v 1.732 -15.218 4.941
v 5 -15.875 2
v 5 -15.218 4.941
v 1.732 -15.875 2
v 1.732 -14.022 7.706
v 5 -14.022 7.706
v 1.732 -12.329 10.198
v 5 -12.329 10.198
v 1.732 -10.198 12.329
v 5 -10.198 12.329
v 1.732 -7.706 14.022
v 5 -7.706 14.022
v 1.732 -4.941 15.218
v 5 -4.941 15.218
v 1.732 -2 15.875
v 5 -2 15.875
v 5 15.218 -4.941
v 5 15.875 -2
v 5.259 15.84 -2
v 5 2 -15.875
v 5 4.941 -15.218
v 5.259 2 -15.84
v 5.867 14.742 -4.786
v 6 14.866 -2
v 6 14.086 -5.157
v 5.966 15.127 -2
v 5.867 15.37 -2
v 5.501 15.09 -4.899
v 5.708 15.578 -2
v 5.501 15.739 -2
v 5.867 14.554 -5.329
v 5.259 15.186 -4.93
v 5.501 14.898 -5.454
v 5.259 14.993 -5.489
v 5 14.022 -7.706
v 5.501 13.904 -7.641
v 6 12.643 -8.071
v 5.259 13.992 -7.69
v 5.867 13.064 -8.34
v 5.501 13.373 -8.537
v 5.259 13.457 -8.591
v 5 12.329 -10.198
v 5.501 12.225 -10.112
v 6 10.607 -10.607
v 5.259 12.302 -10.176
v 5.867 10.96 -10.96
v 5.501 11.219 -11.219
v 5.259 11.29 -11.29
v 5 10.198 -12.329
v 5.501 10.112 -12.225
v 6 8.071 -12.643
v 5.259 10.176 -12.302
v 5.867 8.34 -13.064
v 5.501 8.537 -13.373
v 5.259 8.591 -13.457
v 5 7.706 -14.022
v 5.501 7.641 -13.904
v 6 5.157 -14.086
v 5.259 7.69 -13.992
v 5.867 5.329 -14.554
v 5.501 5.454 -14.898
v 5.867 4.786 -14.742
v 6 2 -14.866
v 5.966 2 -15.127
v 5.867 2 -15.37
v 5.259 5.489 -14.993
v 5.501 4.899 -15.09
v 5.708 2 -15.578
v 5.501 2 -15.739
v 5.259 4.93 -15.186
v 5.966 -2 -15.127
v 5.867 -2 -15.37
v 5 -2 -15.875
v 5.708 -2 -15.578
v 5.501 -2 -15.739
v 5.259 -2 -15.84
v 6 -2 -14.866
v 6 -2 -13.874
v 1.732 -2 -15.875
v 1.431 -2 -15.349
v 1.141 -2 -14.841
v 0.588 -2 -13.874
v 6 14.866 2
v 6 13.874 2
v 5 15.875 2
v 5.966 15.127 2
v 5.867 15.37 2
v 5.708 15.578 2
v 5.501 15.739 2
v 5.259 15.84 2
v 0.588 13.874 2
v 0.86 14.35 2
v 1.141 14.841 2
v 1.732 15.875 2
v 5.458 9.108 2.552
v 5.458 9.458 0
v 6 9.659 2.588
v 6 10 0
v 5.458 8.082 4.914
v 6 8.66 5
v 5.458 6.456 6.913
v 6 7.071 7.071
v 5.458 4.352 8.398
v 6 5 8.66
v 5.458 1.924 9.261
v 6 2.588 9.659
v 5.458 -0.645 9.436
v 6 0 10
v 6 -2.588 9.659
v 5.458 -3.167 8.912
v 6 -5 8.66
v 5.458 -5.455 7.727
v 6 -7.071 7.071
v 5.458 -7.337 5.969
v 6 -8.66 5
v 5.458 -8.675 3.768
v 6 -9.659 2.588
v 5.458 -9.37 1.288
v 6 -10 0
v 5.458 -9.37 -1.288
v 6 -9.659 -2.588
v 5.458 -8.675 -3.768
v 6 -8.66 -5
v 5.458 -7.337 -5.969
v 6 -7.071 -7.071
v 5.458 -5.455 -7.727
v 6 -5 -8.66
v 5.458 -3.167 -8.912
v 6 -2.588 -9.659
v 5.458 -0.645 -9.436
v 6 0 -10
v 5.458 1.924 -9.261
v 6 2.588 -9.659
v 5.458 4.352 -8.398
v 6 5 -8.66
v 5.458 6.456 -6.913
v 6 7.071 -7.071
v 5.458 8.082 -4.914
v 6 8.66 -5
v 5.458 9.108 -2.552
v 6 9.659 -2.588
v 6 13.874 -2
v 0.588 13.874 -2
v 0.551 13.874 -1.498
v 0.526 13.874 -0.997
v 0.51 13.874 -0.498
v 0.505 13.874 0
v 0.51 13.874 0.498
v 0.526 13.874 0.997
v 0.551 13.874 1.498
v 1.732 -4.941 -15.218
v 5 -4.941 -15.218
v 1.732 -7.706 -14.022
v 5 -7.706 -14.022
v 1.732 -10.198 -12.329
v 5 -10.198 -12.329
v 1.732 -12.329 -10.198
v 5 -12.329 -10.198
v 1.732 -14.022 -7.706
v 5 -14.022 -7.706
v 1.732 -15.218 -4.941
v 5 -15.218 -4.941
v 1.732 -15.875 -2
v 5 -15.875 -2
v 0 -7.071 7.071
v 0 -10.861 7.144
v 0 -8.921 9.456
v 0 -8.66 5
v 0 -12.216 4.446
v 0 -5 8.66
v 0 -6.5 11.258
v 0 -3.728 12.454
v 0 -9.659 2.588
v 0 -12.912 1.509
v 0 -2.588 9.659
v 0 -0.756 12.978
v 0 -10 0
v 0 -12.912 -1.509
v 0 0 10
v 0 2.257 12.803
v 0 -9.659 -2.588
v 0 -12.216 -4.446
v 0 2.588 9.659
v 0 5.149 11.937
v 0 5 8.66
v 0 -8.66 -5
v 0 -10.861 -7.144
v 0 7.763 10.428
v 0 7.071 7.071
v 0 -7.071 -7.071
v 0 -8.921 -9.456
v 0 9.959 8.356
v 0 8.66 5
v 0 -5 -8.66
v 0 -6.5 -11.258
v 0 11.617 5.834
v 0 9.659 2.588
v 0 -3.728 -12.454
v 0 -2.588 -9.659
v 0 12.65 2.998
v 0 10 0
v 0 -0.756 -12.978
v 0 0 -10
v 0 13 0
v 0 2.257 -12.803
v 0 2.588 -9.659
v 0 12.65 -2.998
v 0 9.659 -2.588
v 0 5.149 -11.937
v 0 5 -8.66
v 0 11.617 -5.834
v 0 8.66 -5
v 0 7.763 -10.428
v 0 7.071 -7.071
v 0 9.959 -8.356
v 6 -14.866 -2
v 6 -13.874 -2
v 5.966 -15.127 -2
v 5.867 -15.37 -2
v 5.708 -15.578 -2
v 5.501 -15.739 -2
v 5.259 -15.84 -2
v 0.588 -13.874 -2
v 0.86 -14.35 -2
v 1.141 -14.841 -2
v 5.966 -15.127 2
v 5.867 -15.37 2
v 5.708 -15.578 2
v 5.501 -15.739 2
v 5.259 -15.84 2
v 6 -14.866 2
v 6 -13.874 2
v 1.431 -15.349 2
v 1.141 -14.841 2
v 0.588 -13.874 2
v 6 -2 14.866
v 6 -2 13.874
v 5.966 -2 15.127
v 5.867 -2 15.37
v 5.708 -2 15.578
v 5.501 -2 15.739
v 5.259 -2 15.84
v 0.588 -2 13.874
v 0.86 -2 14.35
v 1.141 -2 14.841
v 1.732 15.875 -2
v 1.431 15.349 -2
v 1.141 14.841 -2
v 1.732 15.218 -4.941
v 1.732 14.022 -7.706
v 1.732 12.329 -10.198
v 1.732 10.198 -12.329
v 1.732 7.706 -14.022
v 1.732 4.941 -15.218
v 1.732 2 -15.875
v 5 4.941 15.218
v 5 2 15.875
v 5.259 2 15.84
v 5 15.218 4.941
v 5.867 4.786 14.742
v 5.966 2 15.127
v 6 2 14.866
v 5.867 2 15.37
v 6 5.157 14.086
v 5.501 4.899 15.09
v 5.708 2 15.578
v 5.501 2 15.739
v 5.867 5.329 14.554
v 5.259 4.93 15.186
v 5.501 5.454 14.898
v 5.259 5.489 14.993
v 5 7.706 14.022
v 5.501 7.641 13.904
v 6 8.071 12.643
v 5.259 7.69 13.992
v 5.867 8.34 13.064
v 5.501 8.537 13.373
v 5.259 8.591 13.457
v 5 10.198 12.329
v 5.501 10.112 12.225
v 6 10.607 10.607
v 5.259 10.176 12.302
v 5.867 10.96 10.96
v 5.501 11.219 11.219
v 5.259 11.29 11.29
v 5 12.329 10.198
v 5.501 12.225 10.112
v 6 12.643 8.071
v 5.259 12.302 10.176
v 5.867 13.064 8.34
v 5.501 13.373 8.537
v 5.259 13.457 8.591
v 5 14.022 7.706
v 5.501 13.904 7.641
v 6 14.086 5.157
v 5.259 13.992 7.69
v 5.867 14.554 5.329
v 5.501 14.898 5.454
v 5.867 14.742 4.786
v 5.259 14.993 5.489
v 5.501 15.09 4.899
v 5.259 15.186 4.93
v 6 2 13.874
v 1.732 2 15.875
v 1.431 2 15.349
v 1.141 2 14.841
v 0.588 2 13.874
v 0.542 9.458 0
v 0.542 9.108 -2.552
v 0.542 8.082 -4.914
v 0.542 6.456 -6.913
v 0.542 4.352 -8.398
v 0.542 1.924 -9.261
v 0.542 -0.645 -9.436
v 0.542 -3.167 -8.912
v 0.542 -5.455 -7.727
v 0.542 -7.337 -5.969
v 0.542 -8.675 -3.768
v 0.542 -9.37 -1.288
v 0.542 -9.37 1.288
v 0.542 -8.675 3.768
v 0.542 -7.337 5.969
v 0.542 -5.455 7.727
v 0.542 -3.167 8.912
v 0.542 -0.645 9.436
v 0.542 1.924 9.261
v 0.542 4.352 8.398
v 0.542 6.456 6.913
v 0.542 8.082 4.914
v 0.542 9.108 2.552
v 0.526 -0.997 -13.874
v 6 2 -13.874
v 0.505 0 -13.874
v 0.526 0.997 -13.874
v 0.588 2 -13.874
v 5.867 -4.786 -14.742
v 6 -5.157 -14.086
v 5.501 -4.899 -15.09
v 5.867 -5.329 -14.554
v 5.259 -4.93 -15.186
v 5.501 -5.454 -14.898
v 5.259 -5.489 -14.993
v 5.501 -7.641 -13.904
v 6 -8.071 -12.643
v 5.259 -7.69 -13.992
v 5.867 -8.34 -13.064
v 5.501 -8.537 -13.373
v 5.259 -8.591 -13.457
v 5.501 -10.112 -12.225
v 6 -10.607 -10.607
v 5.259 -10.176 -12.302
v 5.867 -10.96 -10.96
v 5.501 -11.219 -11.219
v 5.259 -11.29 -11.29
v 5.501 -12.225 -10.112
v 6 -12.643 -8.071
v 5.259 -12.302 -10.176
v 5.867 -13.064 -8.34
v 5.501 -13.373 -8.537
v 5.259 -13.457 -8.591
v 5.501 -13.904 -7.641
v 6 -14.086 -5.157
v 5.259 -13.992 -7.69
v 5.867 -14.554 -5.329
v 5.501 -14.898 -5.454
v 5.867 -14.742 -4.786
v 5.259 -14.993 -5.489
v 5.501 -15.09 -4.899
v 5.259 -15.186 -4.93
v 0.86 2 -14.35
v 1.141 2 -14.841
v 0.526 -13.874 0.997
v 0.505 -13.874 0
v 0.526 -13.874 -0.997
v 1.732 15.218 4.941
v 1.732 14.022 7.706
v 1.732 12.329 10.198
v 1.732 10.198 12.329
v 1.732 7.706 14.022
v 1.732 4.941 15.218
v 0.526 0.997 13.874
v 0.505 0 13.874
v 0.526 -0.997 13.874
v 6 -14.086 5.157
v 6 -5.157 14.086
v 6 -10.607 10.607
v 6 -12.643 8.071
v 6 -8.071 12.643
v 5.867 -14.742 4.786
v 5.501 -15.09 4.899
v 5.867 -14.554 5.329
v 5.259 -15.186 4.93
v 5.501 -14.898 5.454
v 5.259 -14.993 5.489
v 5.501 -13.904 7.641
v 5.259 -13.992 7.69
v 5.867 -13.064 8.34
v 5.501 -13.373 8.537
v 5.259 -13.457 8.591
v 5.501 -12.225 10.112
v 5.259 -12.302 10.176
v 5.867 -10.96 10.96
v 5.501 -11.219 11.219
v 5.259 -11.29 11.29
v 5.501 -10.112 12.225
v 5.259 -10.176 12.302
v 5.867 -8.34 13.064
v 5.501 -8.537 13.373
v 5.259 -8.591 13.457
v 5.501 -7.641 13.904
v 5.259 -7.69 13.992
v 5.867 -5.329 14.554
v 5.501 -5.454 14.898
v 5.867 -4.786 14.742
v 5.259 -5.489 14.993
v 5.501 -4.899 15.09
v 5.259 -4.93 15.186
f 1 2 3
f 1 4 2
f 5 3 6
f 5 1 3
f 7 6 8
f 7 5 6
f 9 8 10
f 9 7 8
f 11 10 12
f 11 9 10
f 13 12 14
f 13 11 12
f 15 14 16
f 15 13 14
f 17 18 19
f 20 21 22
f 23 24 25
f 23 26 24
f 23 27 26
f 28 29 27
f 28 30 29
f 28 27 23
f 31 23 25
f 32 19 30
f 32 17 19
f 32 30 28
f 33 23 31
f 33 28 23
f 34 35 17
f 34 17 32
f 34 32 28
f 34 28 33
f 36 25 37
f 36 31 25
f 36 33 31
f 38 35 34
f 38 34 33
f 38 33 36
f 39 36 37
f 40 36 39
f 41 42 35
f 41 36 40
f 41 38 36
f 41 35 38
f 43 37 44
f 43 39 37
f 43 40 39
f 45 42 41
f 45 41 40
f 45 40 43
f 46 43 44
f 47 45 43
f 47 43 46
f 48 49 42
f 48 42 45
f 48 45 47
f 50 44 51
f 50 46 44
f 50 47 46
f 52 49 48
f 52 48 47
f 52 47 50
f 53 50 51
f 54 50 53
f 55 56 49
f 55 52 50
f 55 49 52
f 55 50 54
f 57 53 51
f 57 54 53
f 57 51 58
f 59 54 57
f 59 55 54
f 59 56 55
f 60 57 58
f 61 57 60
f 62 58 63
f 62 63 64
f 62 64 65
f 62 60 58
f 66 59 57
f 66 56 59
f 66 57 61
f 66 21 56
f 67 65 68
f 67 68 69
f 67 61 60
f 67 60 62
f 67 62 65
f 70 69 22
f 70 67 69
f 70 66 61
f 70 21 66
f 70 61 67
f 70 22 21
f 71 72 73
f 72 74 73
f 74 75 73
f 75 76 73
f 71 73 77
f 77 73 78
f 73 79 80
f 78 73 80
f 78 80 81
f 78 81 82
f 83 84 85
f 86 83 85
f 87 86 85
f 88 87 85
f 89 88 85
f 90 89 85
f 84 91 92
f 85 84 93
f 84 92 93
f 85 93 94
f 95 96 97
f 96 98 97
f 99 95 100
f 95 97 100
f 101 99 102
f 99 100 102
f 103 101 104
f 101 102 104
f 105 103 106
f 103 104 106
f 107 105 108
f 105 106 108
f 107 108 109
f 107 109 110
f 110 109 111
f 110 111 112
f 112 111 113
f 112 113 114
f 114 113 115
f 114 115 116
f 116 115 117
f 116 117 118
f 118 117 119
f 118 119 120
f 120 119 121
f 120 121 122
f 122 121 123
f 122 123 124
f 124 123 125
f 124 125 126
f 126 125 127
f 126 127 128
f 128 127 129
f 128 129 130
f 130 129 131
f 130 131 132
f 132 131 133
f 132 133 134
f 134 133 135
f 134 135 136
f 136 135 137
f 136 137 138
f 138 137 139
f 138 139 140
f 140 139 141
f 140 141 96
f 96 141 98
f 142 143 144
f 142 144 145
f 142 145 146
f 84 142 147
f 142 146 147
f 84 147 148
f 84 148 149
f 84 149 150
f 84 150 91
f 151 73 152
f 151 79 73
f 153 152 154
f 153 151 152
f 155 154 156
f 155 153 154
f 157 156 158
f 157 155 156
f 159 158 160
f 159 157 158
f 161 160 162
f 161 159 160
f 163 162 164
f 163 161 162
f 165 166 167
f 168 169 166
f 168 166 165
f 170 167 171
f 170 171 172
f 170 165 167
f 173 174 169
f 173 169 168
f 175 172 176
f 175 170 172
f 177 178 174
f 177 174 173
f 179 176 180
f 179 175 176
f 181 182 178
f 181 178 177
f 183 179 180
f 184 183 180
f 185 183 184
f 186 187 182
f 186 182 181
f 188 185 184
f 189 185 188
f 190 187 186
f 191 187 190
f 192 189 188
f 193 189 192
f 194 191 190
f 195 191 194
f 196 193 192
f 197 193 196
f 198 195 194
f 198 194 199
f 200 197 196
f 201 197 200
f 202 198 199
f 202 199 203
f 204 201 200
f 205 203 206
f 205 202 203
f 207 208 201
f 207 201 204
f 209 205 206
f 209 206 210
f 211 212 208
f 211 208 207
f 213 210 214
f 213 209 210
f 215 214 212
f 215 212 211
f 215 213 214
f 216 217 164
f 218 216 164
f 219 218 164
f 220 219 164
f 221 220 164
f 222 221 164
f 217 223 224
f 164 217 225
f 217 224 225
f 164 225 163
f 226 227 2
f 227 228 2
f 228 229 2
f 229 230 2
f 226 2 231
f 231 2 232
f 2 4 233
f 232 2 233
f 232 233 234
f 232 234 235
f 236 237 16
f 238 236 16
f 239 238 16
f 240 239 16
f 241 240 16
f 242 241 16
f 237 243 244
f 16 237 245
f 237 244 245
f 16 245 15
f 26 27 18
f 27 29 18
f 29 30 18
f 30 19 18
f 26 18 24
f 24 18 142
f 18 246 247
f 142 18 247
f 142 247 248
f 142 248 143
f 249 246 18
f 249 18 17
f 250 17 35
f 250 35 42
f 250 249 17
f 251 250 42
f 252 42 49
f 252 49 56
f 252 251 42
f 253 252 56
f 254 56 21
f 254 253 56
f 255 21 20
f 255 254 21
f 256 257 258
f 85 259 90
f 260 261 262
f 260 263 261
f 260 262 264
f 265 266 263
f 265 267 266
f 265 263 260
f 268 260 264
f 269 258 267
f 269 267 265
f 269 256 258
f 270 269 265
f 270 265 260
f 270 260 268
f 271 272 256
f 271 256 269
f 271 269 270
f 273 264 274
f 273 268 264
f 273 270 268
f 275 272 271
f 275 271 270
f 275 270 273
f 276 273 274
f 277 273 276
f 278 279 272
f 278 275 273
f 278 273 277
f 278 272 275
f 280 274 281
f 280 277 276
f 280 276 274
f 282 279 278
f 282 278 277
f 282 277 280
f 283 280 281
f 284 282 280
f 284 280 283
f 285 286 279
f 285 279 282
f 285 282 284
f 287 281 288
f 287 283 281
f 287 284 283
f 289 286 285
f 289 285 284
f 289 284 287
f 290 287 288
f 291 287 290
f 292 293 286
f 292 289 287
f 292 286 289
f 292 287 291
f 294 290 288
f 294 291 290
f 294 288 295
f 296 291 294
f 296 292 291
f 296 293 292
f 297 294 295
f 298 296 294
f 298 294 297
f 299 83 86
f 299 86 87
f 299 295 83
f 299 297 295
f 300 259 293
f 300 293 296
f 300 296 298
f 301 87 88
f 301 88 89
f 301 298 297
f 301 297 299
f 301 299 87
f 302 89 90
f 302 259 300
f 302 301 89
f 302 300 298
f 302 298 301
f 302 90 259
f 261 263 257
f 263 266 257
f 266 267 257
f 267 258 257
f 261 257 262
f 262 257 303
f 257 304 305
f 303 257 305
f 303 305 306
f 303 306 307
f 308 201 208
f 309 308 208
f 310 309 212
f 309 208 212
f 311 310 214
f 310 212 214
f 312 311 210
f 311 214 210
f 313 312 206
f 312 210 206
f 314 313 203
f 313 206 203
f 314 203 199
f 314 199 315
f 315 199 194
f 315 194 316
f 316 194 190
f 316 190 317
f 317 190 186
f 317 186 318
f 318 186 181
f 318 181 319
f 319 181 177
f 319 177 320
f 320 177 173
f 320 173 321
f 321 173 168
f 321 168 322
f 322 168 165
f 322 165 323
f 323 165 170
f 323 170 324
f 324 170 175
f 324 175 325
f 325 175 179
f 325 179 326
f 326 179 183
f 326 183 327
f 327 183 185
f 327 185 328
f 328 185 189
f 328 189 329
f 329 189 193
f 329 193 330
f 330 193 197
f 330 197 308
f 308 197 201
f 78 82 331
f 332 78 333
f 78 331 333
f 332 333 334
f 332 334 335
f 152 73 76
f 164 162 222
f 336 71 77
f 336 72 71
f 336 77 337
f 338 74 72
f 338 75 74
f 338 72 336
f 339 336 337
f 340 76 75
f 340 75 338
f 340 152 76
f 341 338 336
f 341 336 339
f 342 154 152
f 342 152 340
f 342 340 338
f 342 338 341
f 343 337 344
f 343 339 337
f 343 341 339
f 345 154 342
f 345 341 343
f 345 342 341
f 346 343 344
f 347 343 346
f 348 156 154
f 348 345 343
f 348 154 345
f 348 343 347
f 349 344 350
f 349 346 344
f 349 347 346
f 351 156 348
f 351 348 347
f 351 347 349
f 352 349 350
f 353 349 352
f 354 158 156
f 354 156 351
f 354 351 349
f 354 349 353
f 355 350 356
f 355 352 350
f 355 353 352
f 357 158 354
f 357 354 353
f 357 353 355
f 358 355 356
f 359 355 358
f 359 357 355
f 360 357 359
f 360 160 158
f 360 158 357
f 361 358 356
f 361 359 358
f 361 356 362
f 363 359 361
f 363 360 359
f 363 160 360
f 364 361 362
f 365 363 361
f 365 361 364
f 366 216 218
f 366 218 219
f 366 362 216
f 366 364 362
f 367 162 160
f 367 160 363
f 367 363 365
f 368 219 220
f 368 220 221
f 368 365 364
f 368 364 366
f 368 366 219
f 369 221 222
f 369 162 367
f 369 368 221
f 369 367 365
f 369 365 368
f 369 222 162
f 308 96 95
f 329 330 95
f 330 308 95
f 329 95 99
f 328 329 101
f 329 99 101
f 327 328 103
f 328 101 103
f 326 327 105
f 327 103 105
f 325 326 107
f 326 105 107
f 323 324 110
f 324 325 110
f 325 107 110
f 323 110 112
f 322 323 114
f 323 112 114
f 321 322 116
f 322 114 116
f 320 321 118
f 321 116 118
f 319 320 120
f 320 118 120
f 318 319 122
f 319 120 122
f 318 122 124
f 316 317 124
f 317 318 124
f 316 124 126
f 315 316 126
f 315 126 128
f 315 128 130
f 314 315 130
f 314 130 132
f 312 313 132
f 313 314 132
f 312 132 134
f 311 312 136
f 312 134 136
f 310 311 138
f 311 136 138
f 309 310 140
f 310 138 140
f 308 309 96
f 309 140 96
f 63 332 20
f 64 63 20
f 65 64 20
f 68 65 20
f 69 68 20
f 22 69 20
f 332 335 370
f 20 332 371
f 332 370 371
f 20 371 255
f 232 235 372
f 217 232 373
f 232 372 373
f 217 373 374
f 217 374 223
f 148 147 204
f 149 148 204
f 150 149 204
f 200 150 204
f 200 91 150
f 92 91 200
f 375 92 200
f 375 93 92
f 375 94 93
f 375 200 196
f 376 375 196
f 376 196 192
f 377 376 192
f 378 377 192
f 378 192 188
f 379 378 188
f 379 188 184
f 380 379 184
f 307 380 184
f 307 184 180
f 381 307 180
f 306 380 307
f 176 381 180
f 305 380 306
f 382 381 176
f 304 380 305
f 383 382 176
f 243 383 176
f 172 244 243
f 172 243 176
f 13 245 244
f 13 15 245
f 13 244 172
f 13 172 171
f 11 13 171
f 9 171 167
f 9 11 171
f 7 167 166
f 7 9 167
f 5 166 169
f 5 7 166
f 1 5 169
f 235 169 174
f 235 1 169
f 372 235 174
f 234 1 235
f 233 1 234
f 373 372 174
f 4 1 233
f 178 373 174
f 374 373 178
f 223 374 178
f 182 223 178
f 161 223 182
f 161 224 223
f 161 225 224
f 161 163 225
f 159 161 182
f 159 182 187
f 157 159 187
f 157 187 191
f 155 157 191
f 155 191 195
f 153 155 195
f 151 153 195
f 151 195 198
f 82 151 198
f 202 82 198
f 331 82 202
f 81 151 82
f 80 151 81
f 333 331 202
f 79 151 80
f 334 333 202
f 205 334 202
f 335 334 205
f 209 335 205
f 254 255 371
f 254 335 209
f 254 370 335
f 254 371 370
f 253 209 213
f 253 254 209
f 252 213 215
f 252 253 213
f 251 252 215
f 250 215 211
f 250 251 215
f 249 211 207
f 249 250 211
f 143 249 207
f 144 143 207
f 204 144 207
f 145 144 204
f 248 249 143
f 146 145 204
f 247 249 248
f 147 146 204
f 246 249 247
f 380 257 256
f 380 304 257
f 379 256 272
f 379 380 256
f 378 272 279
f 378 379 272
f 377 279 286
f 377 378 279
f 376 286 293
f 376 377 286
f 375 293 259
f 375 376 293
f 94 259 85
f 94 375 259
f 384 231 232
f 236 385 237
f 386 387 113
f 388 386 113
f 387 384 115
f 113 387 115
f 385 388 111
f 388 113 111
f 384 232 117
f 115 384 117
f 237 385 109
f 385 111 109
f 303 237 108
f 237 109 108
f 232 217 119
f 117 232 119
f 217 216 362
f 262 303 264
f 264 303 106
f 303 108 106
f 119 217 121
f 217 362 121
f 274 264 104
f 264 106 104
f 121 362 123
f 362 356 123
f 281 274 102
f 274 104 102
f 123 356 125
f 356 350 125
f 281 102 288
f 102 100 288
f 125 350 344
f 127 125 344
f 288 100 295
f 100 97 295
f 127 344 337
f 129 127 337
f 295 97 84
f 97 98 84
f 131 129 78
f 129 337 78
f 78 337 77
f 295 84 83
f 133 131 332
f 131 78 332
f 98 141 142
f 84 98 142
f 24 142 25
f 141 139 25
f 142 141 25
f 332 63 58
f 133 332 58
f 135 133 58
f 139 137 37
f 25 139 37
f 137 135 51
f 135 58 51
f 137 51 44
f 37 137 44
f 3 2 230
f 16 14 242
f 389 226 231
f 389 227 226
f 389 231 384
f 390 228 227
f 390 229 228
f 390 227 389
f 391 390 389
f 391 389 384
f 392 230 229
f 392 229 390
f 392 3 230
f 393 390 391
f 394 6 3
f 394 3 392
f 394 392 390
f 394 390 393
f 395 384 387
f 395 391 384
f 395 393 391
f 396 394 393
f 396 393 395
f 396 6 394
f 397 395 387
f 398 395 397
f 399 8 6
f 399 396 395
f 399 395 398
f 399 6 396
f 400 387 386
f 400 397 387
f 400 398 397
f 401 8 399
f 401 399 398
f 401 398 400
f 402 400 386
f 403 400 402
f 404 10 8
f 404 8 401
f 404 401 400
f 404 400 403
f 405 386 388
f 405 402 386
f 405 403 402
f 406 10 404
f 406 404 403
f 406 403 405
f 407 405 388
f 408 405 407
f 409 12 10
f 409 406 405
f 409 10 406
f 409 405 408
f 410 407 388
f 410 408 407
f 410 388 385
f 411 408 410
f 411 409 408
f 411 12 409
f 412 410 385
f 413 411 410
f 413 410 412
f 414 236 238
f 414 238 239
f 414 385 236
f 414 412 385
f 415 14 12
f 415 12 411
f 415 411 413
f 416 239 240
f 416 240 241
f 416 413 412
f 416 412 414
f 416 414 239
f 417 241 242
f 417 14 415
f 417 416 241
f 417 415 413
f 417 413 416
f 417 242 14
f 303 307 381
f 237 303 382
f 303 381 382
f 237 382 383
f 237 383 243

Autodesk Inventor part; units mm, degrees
sketch "Sketch_3" plane through (0, 0, 0) normal (0, 0, 1) x (1, 0, 0)
  line L0 (68, 0) -> (-68, 0)
  line L1 (0, 10) -> (0.5415, 9.4585)
  line L2 (0.5415, 9.4585) -> (5.4585, 9.4585)
  line L3 (5.4585, 9.4585) -> (6, 10)
  line L4 (6, 10) -> (6, 15)
  arc A0 (6, 15) -> (5, 16) centre (5, 15) ccw
  line L5 (5, 16) -> (1.7321, 16)
  line L6 (1.7321, 16) -> (0, 13)
  line L7 (0, 13) -> (0, 10)
revolve "Revolution1" add sketch "Sketch_3" angle 360 about axis through (68, 0, 0) along (-1, 0, 0)
thread "Thread1" size "M20x1" class "6H" standard "ISO Metric profile" full length
sketch "Sketch_6" plane through (0, 0, 0) normal (1, 0, 0) x (0, 1, 0)
  circle A0 centre (0, 0) radius 32
  line L0 (2, 20.9045) -> (2, 13.8745)
  line L1 (2, 13.8745) -> (-2, 13.8745)
  line L2 (-2, 13.8745) -> (-2, 20.9045)
  arc A1 (-2, 20.9045) -> (-20.9045, 2) centre (0, 0) ccw
  line L3 (-20.9045, 2) -> (-13.8745, 2)
  line L4 (-13.8745, 2) -> (-13.8745, -2)
  line L5 (-13.8745, -2) -> (-20.9045, -2)
  arc A2 (-20.9045, -2) -> (-2, -20.9045) centre (0, 0) ccw
  line L6 (-2, -20.9045) -> (-2, -13.8745)
  line L7 (-2, -13.8745) -> (2, -13.8745)
  line L8 (2, -13.8745) -> (2, -20.9045)
  arc A3 (2, -20.9045) -> (20.9045, -2) centre (0, 0) ccw
  line L9 (20.9045, -2) -> (13.8745, -2)
  line L10 (13.8745, -2) -> (13.8745, 2)
  line L11 (13.8745, 2) -> (20.9045, 2)
  arc A4 (20.9045, 2) -> (2, 20.9045) centre (0, 0) ccw
extrude "Extrusion1" cut sketch "Sketch_6" along normal blind 12
ref_plane "km_XY" through (6, 0, 0) normal (1, 0, 0) x (0, 0, -1)
ref_plane "km_YZ" through (6, 0, 0) normal (0, 0, -1) x (0, 1, 0)
ref_plane "km_ZX" through (6, 0, 0) normal (0, 1, 0) x (1, 0, 0)
ref_plane "km2_XY" through (6, 0, 0) normal (1, 0, 0) x (0, 0, -1)
ref_plane "km2_YZ" through (6, 0, 0) normal (0, 0, -1) x (0, 1, 0)
ref_plane "km2_ZX" through (6, 0, 0) normal (0, 1, 0) x (1, 0, 0)
ref_plane "ln_XY" through (0, 0, 0) normal (0, 1, 0) x (1, 0, 0)
ref_plane "ln_YZ" through (0, 0, 0) normal (1, 0, 0) x (0, 0, -1)
ref_plane "ln_ZX" through (0, 0, 0) normal (0, 0, -1) x (0, 1, 0)
ref_plane "nut_XY" through (0, 0, 0) normal (1, 0, 0) x (0, 0, -1)
ref_plane "nut_YZ" through (0, 0, 0) normal (0, 0, -1) x (0, 1, 0)
ref_plane "nut_ZX" through (0, 0, 0) normal (0, 1, 0) x (1, 0, 0)
properties part number "KM 4"
